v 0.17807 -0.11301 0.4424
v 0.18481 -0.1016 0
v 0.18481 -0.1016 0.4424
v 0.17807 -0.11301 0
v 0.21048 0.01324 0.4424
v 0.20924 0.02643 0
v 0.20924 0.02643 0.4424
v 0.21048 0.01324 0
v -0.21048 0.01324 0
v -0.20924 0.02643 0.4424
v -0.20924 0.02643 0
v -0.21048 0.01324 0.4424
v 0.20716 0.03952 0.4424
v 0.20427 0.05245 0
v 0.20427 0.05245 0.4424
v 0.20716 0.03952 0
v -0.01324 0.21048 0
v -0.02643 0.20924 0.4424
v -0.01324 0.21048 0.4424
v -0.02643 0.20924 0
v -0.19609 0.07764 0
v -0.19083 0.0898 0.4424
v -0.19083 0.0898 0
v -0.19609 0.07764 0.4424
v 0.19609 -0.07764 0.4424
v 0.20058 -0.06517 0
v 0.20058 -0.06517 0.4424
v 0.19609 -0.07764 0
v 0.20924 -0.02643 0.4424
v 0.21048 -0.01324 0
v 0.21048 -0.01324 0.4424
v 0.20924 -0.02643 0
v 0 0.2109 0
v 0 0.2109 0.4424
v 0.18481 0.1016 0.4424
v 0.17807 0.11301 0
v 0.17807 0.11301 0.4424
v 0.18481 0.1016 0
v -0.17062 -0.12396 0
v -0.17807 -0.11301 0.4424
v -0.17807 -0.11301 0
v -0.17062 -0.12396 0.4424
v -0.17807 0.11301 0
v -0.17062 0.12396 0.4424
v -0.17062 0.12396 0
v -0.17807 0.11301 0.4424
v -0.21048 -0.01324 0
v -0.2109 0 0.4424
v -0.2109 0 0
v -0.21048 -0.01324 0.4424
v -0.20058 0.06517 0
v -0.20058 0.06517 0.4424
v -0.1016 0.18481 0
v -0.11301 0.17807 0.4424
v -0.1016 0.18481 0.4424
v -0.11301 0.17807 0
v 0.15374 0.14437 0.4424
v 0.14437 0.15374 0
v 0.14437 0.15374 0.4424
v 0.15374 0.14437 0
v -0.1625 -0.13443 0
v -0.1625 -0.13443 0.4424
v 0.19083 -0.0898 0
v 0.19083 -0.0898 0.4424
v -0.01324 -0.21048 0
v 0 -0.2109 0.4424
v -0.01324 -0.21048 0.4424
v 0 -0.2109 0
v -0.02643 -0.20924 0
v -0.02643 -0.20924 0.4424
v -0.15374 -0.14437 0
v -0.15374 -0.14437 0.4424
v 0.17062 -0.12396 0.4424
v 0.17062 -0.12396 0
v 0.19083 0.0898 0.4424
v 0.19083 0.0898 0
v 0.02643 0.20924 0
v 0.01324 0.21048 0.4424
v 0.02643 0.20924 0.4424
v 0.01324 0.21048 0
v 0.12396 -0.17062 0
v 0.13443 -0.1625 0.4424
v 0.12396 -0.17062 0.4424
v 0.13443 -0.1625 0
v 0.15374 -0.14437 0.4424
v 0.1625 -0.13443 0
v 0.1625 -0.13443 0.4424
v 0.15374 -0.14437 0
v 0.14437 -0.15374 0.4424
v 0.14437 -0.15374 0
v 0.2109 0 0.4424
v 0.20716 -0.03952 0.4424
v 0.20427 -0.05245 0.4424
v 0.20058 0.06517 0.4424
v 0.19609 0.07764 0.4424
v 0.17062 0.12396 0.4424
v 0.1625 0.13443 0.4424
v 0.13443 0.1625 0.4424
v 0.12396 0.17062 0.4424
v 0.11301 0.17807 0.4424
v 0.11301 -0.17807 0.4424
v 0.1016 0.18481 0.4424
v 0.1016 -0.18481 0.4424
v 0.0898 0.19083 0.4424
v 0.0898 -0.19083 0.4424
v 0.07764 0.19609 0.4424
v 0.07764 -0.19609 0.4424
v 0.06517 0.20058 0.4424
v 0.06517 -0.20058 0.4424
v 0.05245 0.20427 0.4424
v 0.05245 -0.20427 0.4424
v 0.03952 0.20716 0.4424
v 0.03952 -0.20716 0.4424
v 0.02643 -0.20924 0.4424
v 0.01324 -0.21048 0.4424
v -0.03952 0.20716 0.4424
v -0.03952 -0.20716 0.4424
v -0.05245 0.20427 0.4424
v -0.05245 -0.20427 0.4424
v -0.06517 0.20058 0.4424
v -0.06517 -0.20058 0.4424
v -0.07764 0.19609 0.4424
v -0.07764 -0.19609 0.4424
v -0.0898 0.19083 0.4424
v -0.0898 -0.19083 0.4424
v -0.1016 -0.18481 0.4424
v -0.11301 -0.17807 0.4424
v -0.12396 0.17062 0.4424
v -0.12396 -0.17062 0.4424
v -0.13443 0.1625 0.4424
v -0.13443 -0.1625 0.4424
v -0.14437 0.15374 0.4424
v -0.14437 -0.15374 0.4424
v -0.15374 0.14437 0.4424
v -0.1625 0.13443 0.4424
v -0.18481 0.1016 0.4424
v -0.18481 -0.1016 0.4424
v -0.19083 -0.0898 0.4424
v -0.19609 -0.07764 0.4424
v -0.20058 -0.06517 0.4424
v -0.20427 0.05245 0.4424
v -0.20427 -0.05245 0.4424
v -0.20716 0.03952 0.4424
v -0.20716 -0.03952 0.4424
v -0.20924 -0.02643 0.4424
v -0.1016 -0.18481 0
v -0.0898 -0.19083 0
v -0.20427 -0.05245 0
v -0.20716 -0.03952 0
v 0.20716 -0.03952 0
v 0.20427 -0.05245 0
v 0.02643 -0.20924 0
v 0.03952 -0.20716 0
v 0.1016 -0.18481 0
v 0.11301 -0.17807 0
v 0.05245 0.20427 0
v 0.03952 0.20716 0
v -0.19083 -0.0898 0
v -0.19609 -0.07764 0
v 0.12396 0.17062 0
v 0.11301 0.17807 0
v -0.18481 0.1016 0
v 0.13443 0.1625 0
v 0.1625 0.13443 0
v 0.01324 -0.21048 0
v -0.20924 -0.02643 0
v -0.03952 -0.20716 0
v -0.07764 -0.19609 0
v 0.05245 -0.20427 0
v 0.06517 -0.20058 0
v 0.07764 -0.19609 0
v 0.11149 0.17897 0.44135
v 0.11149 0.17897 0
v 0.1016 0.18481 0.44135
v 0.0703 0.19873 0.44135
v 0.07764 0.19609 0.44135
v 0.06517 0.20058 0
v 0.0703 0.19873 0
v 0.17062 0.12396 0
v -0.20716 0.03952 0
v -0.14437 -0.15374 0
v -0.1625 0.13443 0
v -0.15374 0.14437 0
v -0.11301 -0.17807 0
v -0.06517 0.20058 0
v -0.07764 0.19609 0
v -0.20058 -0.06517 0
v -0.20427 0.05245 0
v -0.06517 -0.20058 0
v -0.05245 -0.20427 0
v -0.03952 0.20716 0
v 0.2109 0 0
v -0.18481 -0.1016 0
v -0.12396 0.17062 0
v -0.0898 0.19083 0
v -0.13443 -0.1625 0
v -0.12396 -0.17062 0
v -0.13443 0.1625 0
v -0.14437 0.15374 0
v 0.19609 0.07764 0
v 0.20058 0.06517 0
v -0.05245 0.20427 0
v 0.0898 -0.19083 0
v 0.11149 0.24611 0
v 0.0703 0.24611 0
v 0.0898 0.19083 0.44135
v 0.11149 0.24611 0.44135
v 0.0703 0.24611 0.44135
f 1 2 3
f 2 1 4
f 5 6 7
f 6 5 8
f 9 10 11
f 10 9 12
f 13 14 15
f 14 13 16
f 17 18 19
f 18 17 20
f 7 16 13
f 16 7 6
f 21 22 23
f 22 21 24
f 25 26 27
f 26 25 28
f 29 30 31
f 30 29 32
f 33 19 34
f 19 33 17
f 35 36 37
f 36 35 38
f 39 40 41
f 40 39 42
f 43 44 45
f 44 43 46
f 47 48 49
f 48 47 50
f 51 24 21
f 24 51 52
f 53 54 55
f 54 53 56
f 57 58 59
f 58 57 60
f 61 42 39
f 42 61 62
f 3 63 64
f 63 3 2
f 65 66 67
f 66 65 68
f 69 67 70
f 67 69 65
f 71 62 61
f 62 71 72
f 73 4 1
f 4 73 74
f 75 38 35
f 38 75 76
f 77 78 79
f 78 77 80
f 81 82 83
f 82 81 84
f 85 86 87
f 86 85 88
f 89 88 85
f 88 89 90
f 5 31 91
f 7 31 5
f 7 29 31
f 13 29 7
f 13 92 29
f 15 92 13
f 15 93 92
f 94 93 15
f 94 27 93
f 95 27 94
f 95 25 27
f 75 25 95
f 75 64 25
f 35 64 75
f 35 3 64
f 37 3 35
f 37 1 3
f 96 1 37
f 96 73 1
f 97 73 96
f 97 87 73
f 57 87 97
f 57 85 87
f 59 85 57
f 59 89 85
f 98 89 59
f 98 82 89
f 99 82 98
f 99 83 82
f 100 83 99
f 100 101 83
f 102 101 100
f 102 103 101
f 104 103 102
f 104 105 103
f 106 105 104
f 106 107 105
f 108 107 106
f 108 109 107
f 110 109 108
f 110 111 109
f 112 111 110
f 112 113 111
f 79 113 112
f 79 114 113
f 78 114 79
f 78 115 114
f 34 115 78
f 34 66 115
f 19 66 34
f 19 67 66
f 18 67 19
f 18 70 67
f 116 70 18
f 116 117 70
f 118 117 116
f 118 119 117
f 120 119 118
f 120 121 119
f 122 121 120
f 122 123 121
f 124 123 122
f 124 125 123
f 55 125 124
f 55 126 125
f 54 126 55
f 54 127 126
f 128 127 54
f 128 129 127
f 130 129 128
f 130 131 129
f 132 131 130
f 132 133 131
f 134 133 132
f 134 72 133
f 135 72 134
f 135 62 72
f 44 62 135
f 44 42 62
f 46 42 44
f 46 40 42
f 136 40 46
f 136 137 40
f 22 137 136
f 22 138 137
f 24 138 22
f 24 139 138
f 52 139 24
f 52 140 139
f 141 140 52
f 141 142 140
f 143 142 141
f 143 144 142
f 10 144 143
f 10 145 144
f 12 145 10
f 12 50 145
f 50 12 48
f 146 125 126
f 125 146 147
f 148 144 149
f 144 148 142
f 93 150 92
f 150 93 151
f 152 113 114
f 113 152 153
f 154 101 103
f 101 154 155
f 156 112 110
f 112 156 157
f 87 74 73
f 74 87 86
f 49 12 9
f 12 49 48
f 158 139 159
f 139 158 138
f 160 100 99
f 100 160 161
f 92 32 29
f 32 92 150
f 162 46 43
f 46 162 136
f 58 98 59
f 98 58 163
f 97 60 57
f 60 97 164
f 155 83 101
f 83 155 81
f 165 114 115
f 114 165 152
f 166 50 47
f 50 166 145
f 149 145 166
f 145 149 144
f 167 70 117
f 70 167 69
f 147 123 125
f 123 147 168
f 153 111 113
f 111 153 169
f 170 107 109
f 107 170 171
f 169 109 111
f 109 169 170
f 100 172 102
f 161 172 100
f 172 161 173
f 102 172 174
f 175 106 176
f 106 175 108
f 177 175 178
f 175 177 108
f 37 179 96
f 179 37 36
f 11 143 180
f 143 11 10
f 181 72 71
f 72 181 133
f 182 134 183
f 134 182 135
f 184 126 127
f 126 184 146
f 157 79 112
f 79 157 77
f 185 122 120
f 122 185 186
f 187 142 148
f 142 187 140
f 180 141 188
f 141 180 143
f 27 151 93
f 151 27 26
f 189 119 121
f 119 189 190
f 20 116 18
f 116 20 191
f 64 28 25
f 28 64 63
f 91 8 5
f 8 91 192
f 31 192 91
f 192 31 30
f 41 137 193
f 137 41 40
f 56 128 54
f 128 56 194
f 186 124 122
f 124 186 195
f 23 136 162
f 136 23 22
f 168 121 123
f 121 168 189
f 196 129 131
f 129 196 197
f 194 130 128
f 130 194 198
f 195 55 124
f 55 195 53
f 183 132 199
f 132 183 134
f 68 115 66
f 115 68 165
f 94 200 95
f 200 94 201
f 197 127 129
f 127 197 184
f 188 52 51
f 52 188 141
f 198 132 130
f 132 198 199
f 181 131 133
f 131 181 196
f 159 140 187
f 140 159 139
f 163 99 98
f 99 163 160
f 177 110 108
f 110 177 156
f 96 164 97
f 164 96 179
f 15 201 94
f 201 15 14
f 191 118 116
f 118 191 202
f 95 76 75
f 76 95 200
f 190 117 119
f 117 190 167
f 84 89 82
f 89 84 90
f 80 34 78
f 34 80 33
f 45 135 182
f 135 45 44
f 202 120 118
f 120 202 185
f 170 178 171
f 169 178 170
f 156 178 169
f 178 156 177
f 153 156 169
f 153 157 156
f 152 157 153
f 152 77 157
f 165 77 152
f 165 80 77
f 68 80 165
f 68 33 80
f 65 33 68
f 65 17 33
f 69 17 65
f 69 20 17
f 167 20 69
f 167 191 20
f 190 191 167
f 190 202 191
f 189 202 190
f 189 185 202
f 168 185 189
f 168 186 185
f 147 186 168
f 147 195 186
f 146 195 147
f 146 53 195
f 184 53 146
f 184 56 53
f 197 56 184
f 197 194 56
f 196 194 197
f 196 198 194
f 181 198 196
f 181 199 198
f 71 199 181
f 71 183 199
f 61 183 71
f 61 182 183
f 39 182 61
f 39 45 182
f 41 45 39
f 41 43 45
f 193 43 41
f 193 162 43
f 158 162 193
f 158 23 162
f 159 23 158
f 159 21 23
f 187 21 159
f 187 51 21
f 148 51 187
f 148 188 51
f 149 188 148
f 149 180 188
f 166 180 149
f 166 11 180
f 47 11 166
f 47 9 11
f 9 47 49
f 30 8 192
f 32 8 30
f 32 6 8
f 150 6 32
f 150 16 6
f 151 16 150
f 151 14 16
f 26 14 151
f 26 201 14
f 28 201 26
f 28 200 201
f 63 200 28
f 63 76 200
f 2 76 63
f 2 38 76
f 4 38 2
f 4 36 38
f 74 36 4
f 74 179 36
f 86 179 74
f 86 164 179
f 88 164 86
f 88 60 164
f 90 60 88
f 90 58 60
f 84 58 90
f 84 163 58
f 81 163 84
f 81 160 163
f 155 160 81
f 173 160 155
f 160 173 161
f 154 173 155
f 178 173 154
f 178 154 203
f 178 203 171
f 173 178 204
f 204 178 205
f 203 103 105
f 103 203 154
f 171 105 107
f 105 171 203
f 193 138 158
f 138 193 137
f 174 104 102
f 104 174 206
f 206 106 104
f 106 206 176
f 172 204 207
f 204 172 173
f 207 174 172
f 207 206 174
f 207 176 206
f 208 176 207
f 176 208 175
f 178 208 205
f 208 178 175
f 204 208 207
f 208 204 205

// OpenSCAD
// Parametric model of a base with circular profiles, upper section, and upright tab
// Units: inches

// === PARAMETERS ===
base_length = 0.75;
base_width = 0.421875;
base_height = 0.191921;
base_extrusion = 0.1919;

// Circular profile 1 (left side)
profile1_x = 0.2109;
profile1_y = 0.2109;
profile1_radius = 0.2109;

// Circular profile 2 (right side, annular)
profile2_x = 0.6094;
profile2_y = 0.2109;
profile2_outer_radius = 0.1406;
profile2_inner_radius = 0.1055;

// Upper circular section
upper_footprint = 0.4218;
upper_left_offset = 0;
upper_right_offset = 0.3282;
upper_front_offset = 0;
upper_back_offset = 0;
upper_total_height = 0.4424;

// Upright rectangular tab
tab_length = 0.041188;
tab_width = 0.070313;
tab_height = 0.441346;
tab_left_offset = 0.0703;
tab_right_offset = 0.6385;
tab_front_offset = 0.1758;
tab_back_offset = 0.1757;

// Resolution
$fn = 100;

// === MODULES ===
// Create a circular profile (solid or annular)
module circular_profile(x, y, outer_r, inner_r = 0) {
    translate([x, y, 0]) {
        if (inner_r == 0) {
            // Solid circle
            circle(r = outer_r);
        } else {
            // Annular ring
            difference() {
                circle(r = outer_r);
                circle(r = inner_r);
            }
        }
    }
}

// Create the base with circular profiles
module base_with_profiles() {
    difference() {
        // Start with rectangular base
        square([base_length, base_width]);
        
        // Subtract circular profiles to create voids
        // Profile 1: solid circle
        circular_profile(profile1_x, profile1_y, profile1_radius);
        
        // Profile 2: annular ring
        circular_profile(profile2_x, profile2_y, 
                        profile2_outer_radius, profile2_inner_radius);
    }
}

// Create the upper circular section
module upper_section() {
    translate([upper_left_offset, upper_front_offset, 0]) {
        linear_extrude(height = upper_total_height) {
            // Circular footprint
            circle(d = upper_footprint);
        }
    }
}

// Create the upright tab
module upright_tab() {
    translate([tab_left_offset, tab_front_offset, 0]) {
        cube([tab_length, tab_width, tab_height]);
    }
}

// === MAIN MODEL ===
// Combine all components
union() {
    // Lower base with profiles (extruded upward)
    linear_extrude(height = base_extrusion) {
        base_with_profiles();
    }
    
    // Upper circular section (extends from base datum to full height)
    upper_section();
    
    // Upright tab (extends from base datum to full height)
    upright_tab();
}
